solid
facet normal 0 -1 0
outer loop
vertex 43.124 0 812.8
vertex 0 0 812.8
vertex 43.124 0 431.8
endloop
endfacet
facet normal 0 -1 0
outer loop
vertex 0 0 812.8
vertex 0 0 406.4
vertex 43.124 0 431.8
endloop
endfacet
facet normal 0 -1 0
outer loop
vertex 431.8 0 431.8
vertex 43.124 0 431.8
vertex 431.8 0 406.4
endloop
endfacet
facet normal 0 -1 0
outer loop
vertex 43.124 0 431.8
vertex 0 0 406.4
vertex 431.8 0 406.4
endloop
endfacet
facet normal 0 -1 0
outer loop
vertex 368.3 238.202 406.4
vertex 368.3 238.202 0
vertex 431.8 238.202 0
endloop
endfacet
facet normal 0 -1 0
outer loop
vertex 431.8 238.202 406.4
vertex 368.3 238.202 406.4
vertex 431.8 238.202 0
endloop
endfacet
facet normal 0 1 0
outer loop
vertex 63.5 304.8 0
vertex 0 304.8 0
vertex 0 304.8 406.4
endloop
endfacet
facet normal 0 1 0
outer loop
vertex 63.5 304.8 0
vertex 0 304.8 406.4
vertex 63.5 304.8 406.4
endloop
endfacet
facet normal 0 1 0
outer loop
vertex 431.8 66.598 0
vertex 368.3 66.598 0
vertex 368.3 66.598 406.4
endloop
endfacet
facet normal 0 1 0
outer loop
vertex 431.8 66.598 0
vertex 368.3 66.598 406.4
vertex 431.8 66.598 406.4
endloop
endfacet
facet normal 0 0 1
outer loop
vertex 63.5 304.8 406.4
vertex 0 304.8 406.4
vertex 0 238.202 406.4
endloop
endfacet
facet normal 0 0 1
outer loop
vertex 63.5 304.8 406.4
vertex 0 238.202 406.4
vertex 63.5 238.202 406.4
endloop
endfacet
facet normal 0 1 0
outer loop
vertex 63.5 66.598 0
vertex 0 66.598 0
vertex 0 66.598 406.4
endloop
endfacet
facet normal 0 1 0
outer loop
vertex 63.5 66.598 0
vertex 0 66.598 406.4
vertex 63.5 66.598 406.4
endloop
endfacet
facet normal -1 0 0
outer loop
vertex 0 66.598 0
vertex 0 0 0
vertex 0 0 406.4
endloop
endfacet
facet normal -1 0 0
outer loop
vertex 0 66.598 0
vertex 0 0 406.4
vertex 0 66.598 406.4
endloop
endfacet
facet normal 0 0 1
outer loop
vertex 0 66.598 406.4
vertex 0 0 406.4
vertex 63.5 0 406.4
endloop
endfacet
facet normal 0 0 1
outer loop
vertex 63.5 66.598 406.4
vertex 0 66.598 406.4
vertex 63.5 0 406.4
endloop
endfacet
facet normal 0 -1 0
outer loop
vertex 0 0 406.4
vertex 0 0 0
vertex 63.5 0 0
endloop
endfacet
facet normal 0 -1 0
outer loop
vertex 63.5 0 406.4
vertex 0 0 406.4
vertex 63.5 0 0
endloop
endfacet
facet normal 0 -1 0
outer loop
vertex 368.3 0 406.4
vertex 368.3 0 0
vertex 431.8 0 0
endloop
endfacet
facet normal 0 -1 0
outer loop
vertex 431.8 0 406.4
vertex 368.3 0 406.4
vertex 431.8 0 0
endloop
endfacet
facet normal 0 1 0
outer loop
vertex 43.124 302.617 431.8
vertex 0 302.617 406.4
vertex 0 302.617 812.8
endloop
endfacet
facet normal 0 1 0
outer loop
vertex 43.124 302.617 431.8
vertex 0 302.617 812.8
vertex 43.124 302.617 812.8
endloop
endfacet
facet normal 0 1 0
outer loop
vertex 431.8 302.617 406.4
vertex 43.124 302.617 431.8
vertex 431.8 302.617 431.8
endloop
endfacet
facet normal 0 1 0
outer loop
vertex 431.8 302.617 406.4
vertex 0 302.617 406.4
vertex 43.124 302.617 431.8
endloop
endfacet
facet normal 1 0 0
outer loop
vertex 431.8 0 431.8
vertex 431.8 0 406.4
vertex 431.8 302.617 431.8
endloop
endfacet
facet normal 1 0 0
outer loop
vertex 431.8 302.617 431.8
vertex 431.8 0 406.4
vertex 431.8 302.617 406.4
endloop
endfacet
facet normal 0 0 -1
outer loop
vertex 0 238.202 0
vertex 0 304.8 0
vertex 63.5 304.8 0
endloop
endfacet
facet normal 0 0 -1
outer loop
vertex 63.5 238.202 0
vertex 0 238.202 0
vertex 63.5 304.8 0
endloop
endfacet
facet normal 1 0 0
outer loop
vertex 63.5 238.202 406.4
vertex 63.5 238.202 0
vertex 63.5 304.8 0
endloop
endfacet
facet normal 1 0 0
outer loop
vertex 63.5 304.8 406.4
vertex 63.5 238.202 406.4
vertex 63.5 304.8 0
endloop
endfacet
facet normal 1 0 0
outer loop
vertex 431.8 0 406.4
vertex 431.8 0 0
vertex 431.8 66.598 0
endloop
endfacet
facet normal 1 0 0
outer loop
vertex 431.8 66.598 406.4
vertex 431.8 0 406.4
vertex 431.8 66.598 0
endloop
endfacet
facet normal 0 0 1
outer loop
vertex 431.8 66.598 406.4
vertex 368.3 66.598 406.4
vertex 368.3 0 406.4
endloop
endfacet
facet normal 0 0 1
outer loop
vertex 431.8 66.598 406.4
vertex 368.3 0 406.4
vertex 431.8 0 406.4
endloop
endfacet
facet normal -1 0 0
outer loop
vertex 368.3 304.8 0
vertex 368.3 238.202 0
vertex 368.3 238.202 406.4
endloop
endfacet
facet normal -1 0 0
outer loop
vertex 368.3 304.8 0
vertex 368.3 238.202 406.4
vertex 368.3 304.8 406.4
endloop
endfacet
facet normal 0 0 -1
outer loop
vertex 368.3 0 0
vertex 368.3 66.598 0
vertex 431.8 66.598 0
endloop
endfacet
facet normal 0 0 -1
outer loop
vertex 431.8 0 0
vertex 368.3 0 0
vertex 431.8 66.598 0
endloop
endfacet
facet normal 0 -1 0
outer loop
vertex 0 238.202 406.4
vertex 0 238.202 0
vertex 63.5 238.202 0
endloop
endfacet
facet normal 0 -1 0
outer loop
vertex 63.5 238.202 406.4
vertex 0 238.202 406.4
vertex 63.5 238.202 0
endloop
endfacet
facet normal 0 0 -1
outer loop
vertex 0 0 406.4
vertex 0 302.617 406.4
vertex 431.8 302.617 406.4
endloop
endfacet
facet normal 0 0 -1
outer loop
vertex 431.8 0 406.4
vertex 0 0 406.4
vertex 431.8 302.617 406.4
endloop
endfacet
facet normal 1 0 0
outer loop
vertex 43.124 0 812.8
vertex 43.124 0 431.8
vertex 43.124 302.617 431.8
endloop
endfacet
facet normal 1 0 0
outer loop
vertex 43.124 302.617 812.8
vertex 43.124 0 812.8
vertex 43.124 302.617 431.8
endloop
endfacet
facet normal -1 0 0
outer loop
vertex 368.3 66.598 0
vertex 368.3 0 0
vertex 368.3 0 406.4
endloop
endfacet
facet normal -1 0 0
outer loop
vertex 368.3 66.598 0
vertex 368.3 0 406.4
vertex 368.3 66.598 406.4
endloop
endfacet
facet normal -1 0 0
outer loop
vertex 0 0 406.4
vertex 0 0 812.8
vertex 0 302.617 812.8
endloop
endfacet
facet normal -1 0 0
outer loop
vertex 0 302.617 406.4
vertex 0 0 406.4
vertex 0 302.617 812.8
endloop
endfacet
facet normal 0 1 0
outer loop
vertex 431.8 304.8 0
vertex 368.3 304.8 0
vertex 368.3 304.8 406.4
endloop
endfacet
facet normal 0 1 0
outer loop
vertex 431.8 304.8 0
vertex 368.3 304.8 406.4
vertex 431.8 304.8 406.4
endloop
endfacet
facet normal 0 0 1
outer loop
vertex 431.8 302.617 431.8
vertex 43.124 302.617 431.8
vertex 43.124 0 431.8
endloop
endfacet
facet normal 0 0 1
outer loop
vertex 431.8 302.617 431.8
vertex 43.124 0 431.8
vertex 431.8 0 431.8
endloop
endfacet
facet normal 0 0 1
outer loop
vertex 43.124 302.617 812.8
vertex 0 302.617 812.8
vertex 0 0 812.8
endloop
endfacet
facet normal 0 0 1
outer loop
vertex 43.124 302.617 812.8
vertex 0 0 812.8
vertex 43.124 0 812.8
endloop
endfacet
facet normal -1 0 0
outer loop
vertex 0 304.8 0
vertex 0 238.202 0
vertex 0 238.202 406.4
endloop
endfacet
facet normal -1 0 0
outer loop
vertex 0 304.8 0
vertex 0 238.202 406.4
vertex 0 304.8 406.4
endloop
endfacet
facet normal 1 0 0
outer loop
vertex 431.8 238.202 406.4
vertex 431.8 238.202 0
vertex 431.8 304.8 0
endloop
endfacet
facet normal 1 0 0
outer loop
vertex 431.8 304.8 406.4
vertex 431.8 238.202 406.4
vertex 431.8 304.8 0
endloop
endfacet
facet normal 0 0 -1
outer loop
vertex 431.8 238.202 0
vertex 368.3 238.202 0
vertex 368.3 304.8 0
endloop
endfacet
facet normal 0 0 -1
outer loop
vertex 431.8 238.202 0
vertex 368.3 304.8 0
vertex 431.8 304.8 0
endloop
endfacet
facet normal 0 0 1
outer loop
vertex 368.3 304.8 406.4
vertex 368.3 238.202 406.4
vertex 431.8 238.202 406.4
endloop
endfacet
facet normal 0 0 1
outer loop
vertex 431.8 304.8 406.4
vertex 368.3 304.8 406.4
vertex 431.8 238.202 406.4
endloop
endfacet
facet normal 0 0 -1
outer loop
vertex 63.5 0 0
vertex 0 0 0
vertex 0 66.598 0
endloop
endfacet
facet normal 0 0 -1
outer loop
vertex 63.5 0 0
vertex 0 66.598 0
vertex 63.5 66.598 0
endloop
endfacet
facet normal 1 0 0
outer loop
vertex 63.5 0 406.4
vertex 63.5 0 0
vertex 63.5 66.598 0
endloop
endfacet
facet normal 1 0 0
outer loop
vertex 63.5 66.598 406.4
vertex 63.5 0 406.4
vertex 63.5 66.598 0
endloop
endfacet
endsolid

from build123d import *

# Parameters (mm, degrees)
F0_W     = 63.5
F0_H     = 66.597568
F1_DEPTH = 406.4
F2_W     = 431.8
F2_H     = 302.617073
F3_DEPTH = 25.4
F4_W     = 43.124486
F4_H     = 302.617073
F5_DEPTH = 381


with BuildPart() as f1:
    # F0 (on Top) → F1 (new body)
    with BuildSketch(Plane.XY):
        with Locations((400.05, 33.298784)):
            Rectangle(F0_W, F0_H)
        with Locations((31.75, 33.298784)):
            Rectangle(F0_W, F0_H)
        with Locations((31.75, 271.501216)):
            Rectangle(F0_W, F0_H)
        with Locations((400.05, 271.501216)):
            Rectangle(F0_W, F0_H)
    extrude(amount=F1_DEPTH)


with BuildPart() as f3:
    # F2 (on face) → F3 (new body)
    with BuildSketch(Plane.XY.offset(406.4)):
        with Locations((215.9, 151.308537)):
            Rectangle(F2_W, F2_H)
    extrude(amount=F3_DEPTH)

    # F4 (on face) → F5 (join)
    with BuildSketch(Plane.XY.offset(431.8)):
        with Locations((21.562243, 151.308537)):
            Rectangle(F4_W, F4_H)
    extrude(amount=F5_DEPTH)


solid = Compound([f1.part, f3.part])
